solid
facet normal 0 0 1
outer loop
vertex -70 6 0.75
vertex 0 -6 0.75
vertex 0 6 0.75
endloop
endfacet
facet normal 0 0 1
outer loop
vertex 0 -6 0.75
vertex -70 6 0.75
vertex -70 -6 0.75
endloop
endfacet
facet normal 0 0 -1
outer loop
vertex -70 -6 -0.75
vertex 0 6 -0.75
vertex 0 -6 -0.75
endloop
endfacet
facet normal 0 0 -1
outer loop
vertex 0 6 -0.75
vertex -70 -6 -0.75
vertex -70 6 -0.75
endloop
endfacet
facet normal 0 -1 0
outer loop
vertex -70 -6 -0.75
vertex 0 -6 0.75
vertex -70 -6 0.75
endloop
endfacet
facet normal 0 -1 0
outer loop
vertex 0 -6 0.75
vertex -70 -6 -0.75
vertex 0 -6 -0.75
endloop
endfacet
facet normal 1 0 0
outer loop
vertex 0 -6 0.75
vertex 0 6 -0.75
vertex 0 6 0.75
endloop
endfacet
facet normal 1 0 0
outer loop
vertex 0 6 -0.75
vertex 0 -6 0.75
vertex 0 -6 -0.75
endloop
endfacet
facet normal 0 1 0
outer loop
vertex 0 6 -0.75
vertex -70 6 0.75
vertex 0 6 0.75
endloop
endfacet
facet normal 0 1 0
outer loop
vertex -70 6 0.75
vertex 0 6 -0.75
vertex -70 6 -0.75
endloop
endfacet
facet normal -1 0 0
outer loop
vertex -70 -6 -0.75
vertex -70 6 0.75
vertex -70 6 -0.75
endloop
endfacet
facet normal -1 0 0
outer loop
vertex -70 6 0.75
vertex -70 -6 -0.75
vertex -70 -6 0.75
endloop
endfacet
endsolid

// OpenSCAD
// Built by bench/smallmodels/features/compiler.py from a list of features.
$fn = 64;
union() {
    translate([-35, 0, -0.75]) translate([-35, -6, 0]) cube([70, 12, 1.5]);
  }
